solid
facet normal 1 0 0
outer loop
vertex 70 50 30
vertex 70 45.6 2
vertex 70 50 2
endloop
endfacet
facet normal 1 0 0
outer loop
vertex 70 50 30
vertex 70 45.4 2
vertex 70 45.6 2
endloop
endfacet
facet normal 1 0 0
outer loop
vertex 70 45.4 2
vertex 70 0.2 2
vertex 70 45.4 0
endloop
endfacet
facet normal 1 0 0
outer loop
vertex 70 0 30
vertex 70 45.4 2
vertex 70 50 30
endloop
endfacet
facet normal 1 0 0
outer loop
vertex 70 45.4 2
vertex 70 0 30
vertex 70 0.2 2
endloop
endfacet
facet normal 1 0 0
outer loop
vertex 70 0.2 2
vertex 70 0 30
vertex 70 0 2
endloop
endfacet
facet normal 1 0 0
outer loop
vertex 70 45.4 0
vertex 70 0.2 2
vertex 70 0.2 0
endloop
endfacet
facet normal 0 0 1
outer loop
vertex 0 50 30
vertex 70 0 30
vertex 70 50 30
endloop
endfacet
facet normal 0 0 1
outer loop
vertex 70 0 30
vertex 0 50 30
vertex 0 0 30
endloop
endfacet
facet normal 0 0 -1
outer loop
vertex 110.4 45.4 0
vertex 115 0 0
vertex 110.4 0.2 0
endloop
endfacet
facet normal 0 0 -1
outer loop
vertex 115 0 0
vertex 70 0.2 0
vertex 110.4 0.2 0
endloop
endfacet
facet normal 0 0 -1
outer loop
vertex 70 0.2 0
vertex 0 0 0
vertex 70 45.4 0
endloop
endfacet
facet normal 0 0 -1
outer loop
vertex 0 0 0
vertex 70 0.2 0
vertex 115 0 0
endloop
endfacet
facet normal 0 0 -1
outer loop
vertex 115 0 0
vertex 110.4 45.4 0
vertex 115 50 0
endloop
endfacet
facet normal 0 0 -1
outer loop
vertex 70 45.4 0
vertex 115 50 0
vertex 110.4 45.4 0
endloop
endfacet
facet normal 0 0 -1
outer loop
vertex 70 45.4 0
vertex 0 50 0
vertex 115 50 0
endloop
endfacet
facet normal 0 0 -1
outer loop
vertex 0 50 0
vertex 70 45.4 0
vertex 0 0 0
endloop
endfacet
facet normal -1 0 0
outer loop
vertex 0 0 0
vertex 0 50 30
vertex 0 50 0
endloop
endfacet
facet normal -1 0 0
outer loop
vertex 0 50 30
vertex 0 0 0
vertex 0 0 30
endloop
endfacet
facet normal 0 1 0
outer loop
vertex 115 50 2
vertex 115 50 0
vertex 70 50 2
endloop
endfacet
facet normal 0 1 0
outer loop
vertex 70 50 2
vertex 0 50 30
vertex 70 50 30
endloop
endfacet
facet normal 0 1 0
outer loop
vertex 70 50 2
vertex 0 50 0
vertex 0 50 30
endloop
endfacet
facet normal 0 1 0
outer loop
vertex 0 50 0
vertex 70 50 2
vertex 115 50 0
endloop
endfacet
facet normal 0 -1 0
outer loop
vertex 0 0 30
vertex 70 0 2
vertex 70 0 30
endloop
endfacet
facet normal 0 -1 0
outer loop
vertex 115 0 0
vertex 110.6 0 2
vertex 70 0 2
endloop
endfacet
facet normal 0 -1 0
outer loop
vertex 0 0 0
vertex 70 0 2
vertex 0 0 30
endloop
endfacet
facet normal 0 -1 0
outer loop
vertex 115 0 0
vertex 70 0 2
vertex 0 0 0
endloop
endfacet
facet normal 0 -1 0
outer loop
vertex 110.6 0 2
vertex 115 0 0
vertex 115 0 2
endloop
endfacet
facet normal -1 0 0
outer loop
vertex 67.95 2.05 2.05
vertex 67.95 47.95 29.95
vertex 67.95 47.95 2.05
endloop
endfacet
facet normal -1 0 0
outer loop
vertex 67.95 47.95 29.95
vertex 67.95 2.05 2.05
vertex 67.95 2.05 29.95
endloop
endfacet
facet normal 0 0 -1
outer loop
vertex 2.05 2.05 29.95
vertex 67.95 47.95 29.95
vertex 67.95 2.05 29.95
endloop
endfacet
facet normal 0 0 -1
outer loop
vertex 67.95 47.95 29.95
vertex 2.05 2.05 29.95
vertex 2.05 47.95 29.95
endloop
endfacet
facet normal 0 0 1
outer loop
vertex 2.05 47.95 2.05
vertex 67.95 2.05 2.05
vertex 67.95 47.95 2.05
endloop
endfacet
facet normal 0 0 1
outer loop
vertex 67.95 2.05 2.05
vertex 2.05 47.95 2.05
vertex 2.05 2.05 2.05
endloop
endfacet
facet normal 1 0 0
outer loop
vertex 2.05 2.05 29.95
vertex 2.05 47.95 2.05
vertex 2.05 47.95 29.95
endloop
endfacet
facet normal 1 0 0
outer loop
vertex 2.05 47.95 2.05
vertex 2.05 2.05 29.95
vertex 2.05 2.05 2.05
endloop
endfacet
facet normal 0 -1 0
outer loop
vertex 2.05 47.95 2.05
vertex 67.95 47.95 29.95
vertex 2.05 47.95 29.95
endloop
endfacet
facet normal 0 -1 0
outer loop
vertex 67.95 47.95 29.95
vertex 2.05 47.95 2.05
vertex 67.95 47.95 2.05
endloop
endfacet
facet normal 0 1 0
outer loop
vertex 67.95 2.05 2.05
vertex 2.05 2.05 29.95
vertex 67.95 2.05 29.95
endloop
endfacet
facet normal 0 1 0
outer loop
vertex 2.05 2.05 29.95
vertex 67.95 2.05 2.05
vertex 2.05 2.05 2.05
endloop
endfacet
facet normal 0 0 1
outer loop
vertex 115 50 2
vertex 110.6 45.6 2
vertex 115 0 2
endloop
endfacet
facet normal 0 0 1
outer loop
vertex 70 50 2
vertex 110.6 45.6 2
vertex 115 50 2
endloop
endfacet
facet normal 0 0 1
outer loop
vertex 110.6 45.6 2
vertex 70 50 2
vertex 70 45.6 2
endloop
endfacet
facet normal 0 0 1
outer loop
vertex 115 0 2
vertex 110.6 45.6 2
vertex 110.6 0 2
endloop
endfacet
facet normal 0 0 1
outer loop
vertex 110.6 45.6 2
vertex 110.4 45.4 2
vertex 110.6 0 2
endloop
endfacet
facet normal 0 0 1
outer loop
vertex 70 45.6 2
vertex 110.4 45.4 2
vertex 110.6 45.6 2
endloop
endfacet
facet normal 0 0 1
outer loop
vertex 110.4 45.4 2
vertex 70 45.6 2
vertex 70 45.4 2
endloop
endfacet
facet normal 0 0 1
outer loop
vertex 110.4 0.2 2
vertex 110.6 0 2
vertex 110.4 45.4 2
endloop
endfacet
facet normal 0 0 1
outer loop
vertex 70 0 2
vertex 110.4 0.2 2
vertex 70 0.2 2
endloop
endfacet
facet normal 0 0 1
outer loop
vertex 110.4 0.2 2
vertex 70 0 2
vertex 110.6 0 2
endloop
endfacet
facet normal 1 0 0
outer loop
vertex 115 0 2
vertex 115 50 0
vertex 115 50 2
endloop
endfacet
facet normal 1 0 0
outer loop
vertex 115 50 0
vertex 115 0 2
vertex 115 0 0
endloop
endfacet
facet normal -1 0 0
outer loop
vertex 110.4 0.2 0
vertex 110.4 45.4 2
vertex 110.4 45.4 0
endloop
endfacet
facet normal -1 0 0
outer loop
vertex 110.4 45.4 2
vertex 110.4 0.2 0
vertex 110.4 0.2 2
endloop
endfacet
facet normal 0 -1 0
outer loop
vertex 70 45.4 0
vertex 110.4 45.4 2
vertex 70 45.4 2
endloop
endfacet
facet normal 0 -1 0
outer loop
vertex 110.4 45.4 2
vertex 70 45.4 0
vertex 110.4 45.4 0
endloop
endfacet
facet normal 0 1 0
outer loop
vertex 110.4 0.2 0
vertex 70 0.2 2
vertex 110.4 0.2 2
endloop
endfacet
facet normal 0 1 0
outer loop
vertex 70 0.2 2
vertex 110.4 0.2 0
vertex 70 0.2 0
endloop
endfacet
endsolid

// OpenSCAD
// Configuration and Dimensions
// All dimensions in millimetres (mm)

// Box Dimensions (Outer)
$box_outer_x = 70;
$box_outer_y = 50;
$box_outer_z = 30;

// Wall and Floor Thickness
$wall_thickness = 2;
$floor_thickness = 2;

// Lid Dimensions
$plate_thickness = 2;
$lip_thickness = 1.5;
$lip_height = 4;

// Lip Outer Size (to fit inside box opening)
$lip_outer_x = 65.6;
$lip_outer_y = 45.6;

// Clearance
$clearance = 0.2;

// Gap between parts for printing together
$gap = 10;

// Resolution for curved shapes
$fn = 64;

// --- Part 1: The Box ---
// Position: Centred on origin in X, Y. Z starts at 0.
// Outer box is 70x50x30.
// Inner cavity calculation:
// Inner X = 70 - 2*2 = 66
// Inner Y = 50 - 2*2 = 46
// Inner Z = 30 - 2 (floor) = 28 (open top)

translate([0, 0, 0])
difference() {
    // Outer Shell
    cube([
        $box_outer_x, 
        $box_outer_y, 
        $box_outer_z
    ]);
    
    // Cut out the interior
    // We extend the cut slightly past the faces to ensure clean separation
    translate([
        $wall_thickness + 0.05, 
        $wall_thickness + 0.05, 
        $floor_thickness + 0.05
    ])
    cube([
        $box_outer_x - 2*$wall_thickness - 0.1, 
        $box_outer_y - 2*$wall_thickness - 0.1, 
        $box_outer_z - $floor_thickness - 0.1
    ]);
}

// --- Part 2: The Lid ---
// Position: On the +X side of the box, with a 10mm gap.
// Box ends at X = 35. Lid starts at X = 35 + 10 = 45.
// Lid is printed upside down (plate on bed).
// Plate size: 70 x 50 x 2.
// Lip: Outer 65.6 x 45.6, Inner (to fit box) = 65.6 - 0.4 = 65.2 x 45.6 - 0.4 = 45.2.
// Lip thickness 1.5, height 4.

translate([
    $box_outer_x / 2 + $gap, 
    0, 
    0
])
difference() {
    // 1. The Base Plate (70 x 50 x 2)
    cube([
        $box_outer_x, 
        $box_outer_y, 
        $plate_thickness
    ]);
    
    // 2. The Lip Structure (Hollowed out to slide in)
    // The lip sits ON TOP of the plate (Z = 2 to Z = 6).
    // Outer dimensions of lip: 65.6 x 45.6
    // Inner dimensions of lip (hole): 65.2 x 45.2 (0.2mm clearance each side)
    // Thickness of lip wall: 1.5mm
    
    // We create a solid block for the lip and subtract the hole.
    // Lip block position: Z = 2 (top of plate)
    translate([0, 0, $plate_thickness])
    union() {
        // Solid block representing the lip material
        cube([
            $lip_outer_x, 
            $lip_outer_y, 
            $lip_thickness + $lip_height
        ]);
        
        // Hole through the lip
        translate([
            ($lip_outer_x - ($lip_outer_x - $clearance*2)) / 2, // Centering logic simplified:
            // Actually, let's calculate inner dimensions directly
            ($lip_outer_x - ($lip_outer_x - $clearance*2)) / 2, 
            ($lip_outer_y - ($lip_outer_y - $clearance*2)) / 2, 
            $plate_thickness + $lip_thickness + 0.05 // Extend past bottom
        ])
        cube([
            $lip_outer_x - $clearance*2, 
            $lip_outer_y - $clearance*2, 
            $lip_thickness + $lip_height + 0.05
        ]);
    }
    
    // 3. Cut the hole through the base plate so the lip can slide in
    // Hole dimensions match the inner lip dimensions
    translate([
        ($lip_outer_x - ($lip_outer_x - $clearance*2)) / 2,
        ($lip_outer_y - ($lip_outer_y - $clearance*2)) / 2,
        0
    ])
    cube([
        $lip_outer_x - $clearance*2, 
        $lip_outer_y - $clearance*2, 
        $plate_thickness + 0.05 // Extend past top of plate
    ]);
}
